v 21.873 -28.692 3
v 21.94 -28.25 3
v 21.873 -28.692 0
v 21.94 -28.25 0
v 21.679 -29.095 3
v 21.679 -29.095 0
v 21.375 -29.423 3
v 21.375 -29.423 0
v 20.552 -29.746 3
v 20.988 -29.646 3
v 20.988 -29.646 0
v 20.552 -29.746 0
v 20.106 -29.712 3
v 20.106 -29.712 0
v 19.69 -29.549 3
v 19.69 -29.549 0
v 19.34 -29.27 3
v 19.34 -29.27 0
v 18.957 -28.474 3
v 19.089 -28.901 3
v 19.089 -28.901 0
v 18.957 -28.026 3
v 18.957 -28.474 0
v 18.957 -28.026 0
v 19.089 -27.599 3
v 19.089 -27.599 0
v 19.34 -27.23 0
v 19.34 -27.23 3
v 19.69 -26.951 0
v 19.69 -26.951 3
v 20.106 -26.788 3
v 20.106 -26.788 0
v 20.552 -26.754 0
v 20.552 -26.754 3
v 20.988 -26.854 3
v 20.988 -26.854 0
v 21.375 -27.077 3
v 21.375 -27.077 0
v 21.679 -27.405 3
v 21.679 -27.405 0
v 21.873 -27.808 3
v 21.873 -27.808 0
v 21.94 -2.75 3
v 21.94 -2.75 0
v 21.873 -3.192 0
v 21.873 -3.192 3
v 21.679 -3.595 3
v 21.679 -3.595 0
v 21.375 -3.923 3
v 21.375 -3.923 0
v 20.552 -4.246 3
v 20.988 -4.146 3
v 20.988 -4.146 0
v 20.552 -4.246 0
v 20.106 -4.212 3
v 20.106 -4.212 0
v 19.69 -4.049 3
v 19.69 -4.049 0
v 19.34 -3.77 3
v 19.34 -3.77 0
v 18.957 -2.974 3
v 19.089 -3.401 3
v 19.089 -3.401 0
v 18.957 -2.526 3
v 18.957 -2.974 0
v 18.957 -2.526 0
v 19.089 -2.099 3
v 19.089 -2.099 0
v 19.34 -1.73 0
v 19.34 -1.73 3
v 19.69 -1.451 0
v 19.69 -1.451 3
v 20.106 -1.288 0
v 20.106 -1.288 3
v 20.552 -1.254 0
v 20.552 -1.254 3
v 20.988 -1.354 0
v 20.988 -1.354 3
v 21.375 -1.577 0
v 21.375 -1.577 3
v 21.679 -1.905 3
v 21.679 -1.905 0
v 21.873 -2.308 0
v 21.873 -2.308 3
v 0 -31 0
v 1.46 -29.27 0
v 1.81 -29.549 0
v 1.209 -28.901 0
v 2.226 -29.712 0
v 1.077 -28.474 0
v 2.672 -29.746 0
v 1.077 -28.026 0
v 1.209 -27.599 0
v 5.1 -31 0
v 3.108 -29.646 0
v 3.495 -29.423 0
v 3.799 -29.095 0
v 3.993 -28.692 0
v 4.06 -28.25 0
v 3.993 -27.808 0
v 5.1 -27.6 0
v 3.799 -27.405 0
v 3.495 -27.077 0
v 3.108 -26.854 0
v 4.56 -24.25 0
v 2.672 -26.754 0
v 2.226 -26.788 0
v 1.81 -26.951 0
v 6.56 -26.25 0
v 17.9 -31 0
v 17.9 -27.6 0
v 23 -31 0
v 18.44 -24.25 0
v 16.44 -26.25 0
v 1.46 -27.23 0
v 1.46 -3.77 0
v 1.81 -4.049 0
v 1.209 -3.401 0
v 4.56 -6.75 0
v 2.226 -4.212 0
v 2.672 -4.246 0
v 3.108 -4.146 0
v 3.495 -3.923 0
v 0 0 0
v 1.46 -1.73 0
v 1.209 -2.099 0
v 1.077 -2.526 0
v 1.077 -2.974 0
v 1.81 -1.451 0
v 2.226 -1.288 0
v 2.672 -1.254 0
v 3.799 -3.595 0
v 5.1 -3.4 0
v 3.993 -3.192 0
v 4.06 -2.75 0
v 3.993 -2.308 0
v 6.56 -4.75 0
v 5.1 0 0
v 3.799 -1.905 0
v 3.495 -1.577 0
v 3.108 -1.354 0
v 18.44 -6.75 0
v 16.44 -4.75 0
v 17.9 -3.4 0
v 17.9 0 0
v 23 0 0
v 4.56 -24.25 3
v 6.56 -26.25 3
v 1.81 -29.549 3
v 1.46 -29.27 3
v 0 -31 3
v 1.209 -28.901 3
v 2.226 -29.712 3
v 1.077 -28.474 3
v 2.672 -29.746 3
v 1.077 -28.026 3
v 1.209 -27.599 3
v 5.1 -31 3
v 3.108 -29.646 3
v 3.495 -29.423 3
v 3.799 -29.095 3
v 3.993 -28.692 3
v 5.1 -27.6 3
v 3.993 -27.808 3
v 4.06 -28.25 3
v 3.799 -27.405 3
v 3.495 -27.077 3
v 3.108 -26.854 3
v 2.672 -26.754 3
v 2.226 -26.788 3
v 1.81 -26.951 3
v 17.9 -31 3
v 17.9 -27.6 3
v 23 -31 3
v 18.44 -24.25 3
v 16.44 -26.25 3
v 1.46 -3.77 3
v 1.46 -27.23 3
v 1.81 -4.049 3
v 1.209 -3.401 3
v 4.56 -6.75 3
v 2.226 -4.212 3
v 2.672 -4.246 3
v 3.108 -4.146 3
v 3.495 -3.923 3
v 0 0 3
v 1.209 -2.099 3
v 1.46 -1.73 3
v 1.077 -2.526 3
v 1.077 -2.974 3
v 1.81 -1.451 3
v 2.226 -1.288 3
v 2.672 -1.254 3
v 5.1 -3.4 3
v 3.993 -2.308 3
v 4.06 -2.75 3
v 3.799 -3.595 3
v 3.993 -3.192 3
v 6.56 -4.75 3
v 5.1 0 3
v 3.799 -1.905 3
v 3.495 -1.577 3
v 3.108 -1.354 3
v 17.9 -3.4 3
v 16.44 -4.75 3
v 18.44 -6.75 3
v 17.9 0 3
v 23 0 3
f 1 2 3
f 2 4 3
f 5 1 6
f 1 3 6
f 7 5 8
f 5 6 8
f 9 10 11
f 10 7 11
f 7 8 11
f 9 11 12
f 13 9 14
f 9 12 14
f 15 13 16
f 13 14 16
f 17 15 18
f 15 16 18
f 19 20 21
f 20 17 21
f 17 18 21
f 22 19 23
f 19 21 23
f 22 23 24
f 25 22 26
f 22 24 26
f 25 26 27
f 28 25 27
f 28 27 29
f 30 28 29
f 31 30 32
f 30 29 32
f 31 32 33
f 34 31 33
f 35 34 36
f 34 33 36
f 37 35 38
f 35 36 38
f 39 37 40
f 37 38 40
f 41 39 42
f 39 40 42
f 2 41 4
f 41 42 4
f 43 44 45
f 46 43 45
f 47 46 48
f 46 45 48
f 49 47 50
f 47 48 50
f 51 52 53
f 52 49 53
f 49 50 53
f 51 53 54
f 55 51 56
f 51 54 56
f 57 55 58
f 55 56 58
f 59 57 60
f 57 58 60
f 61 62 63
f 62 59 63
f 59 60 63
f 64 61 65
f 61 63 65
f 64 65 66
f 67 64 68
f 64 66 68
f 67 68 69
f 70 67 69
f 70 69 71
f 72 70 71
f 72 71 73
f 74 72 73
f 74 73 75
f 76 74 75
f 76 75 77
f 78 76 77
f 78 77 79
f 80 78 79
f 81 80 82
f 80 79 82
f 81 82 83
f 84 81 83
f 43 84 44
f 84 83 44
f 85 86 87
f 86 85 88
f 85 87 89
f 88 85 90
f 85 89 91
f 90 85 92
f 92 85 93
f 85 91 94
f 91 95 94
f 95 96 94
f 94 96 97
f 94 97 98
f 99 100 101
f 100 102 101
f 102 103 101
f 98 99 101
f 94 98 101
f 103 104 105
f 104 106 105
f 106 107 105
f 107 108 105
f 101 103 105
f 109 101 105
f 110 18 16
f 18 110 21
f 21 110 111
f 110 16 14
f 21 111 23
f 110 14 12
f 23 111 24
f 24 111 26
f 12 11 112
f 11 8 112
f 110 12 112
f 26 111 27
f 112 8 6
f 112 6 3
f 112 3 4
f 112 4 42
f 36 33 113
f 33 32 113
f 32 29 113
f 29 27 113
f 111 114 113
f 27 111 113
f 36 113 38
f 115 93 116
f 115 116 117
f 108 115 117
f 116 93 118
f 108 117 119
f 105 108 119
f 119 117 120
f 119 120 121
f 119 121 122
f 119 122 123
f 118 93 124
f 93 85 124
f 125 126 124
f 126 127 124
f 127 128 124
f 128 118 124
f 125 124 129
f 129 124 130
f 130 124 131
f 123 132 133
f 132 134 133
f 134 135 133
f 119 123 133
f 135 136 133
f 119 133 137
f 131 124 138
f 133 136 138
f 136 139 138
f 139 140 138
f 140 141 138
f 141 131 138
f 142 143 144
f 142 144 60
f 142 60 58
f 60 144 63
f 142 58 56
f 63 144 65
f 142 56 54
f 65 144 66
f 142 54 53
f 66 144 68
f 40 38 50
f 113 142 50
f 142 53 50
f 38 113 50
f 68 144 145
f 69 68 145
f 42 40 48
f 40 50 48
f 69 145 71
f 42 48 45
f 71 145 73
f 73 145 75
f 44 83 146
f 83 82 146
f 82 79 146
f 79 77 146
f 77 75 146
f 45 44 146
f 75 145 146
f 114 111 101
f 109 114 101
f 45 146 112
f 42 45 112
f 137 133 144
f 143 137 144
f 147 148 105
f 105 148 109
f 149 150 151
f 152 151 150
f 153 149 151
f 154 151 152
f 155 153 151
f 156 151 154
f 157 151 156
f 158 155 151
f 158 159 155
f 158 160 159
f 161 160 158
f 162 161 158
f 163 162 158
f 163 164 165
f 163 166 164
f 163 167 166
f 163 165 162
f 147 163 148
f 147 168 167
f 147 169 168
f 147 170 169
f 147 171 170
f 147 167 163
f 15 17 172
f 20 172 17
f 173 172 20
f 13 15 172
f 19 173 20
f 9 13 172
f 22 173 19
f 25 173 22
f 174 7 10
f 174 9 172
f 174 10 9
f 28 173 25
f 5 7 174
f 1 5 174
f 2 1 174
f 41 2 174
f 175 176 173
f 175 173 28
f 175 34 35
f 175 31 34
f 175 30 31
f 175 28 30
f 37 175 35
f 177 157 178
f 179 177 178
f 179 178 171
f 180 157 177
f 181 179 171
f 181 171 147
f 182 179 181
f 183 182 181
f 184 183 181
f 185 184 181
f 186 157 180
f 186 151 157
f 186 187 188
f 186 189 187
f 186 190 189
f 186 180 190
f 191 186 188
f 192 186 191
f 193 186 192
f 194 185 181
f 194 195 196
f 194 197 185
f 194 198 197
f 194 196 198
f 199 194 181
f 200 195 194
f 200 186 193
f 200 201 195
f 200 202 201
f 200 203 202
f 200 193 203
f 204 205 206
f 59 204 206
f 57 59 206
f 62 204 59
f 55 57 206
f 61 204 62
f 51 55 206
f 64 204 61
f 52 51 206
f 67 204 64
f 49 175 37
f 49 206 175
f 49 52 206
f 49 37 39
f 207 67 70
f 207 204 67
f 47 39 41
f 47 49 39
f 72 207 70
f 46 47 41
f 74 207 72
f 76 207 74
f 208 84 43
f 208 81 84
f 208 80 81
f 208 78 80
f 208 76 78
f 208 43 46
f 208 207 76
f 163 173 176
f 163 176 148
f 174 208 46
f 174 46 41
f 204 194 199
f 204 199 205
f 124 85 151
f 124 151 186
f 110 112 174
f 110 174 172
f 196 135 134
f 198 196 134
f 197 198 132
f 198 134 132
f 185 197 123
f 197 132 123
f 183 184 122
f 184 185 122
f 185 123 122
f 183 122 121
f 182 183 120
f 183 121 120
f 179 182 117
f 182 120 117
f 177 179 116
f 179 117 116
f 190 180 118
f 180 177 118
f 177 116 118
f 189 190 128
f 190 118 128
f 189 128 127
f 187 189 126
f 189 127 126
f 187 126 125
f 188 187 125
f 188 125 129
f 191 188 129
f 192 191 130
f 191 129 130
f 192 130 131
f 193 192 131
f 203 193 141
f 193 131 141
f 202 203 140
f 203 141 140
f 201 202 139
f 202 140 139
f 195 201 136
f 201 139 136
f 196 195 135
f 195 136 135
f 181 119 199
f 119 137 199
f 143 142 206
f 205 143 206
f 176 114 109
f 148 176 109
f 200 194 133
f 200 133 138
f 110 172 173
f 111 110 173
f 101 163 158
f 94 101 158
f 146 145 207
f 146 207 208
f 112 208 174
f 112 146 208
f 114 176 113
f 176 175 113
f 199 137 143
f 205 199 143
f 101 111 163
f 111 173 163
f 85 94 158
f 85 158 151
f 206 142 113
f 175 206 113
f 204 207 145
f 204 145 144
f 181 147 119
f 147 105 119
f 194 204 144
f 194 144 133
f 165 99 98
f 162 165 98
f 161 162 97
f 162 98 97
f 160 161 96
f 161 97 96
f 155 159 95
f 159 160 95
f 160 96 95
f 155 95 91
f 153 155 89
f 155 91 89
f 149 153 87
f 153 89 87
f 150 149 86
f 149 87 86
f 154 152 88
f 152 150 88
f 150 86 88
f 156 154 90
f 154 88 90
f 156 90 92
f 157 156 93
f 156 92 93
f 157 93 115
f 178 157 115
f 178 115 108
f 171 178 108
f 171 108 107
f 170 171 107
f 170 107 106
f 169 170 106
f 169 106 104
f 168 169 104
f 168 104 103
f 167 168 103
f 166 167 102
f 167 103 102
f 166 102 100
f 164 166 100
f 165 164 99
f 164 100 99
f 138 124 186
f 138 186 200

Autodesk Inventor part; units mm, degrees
ref_plane "YZ Plane" through (0, 0, 0) normal (1, 0, 0) x (0, 1, 0)
ref_plane "XZ Plane" through (0, 0, 0) normal (0, 1, 0) x (-1, 0, 0)
ref_plane "XY Plane" through (0, 0, 0) normal (0, 0, 1) x (1, 0, 0)
sketch "Skizze1" plane through (0, 0, 0) normal (0, 0, 1) x (1, 0, 0)
  line L0 (0, 0) -> (23, 0)
  line L1 (23, 0) -> (23, -31)
  line L2 (23, -31) -> (0, -31)
  line L3 (0, -31) -> (0, 0)
  line L4 (2.56, -2.75) -> (20.44, -2.75) construction
  line L5 (20.44, -2.75) -> (20.44, -28.25) construction
  line L6 (20.44, -28.25) -> (2.56, -28.25) construction
  line L7 (2.56, -28.25) -> (2.56, -2.75) construction
  circle A0 centre (2.56, -2.75) radius 1.5
  circle A1 centre (20.44, -2.75) radius 1.5
  circle A2 centre (2.56, -28.25) radius 1.5
  circle A3 centre (20.44, -28.25) radius 1.5
  line L8 (4.56, -4.75) -> (18.44, -4.75)
  line L9 (18.44, -4.75) -> (18.44, -26.25)
  line L10 (18.44, -26.25) -> (4.56, -26.25)
  line L11 (4.56, -26.25) -> (4.56, -4.75)
  dimension "d0" = 23
  dimension "d1" = 31
  dimension "d2" = 17.88
  dimension "d3" = 25.5
  dimension "d4" = 2.75
  dimension "d5" = 2.56
  dimension "d6" = 3
  dimension "d7" = 3
  dimension "d8" = 3
  dimension "d9" = 3
  dimension "d10" = 2
  dimension "d11" = 2
  dimension "d12" = 2
  dimension "d13" = 2
extrude "Extrusion1" add sketch "Skizze1" along normal blind 3
sketch "Skizze2" plane through (0, 0, 3) normal (0, 0, 1) x (1, 0, 0)
  line L0 (5.1, -31) -> (17.9, -31)
  line L1 (17.9, -31) -> (17.9, -27.6)
  line L2 (17.9, -27.6) -> (5.1, -27.6)
  line L3 (5.1, -27.6) -> (5.1, -31)
  line L4 (23, 0) -> (0, 0) projected
  line L5 (5.1, 0) -> (17.9, 0)
  line L6 (17.9, 0) -> (17.9, -3.4)
  line L7 (17.9, -3.4) -> (5.1, -3.4)
  line L8 (5.1, -3.4) -> (5.1, 0)
  line L9 (0, -31) -> (23, -31) projected
  line L10 (0, 0) -> (0, -31) projected
  dimension "d16" = 3.4
  dimension "d17" = 3.4
  dimension "d18" = 12.8
  dimension "d19" = 5.1
extrude "Extrusion2" cut sketch "Skizze2" against normal blind 3
chamfer "Fase1" distance 2 angle 45 4 edges at (4.56, -4.75, 1.5) (18.44, -4.75, 1.5) (4.56, -26.25, 1.5) (18.44, -26.25, 1.5)
properties part number "CFV4_Scale_HX711_Baseplate" material "ABS-Kunststoff"
